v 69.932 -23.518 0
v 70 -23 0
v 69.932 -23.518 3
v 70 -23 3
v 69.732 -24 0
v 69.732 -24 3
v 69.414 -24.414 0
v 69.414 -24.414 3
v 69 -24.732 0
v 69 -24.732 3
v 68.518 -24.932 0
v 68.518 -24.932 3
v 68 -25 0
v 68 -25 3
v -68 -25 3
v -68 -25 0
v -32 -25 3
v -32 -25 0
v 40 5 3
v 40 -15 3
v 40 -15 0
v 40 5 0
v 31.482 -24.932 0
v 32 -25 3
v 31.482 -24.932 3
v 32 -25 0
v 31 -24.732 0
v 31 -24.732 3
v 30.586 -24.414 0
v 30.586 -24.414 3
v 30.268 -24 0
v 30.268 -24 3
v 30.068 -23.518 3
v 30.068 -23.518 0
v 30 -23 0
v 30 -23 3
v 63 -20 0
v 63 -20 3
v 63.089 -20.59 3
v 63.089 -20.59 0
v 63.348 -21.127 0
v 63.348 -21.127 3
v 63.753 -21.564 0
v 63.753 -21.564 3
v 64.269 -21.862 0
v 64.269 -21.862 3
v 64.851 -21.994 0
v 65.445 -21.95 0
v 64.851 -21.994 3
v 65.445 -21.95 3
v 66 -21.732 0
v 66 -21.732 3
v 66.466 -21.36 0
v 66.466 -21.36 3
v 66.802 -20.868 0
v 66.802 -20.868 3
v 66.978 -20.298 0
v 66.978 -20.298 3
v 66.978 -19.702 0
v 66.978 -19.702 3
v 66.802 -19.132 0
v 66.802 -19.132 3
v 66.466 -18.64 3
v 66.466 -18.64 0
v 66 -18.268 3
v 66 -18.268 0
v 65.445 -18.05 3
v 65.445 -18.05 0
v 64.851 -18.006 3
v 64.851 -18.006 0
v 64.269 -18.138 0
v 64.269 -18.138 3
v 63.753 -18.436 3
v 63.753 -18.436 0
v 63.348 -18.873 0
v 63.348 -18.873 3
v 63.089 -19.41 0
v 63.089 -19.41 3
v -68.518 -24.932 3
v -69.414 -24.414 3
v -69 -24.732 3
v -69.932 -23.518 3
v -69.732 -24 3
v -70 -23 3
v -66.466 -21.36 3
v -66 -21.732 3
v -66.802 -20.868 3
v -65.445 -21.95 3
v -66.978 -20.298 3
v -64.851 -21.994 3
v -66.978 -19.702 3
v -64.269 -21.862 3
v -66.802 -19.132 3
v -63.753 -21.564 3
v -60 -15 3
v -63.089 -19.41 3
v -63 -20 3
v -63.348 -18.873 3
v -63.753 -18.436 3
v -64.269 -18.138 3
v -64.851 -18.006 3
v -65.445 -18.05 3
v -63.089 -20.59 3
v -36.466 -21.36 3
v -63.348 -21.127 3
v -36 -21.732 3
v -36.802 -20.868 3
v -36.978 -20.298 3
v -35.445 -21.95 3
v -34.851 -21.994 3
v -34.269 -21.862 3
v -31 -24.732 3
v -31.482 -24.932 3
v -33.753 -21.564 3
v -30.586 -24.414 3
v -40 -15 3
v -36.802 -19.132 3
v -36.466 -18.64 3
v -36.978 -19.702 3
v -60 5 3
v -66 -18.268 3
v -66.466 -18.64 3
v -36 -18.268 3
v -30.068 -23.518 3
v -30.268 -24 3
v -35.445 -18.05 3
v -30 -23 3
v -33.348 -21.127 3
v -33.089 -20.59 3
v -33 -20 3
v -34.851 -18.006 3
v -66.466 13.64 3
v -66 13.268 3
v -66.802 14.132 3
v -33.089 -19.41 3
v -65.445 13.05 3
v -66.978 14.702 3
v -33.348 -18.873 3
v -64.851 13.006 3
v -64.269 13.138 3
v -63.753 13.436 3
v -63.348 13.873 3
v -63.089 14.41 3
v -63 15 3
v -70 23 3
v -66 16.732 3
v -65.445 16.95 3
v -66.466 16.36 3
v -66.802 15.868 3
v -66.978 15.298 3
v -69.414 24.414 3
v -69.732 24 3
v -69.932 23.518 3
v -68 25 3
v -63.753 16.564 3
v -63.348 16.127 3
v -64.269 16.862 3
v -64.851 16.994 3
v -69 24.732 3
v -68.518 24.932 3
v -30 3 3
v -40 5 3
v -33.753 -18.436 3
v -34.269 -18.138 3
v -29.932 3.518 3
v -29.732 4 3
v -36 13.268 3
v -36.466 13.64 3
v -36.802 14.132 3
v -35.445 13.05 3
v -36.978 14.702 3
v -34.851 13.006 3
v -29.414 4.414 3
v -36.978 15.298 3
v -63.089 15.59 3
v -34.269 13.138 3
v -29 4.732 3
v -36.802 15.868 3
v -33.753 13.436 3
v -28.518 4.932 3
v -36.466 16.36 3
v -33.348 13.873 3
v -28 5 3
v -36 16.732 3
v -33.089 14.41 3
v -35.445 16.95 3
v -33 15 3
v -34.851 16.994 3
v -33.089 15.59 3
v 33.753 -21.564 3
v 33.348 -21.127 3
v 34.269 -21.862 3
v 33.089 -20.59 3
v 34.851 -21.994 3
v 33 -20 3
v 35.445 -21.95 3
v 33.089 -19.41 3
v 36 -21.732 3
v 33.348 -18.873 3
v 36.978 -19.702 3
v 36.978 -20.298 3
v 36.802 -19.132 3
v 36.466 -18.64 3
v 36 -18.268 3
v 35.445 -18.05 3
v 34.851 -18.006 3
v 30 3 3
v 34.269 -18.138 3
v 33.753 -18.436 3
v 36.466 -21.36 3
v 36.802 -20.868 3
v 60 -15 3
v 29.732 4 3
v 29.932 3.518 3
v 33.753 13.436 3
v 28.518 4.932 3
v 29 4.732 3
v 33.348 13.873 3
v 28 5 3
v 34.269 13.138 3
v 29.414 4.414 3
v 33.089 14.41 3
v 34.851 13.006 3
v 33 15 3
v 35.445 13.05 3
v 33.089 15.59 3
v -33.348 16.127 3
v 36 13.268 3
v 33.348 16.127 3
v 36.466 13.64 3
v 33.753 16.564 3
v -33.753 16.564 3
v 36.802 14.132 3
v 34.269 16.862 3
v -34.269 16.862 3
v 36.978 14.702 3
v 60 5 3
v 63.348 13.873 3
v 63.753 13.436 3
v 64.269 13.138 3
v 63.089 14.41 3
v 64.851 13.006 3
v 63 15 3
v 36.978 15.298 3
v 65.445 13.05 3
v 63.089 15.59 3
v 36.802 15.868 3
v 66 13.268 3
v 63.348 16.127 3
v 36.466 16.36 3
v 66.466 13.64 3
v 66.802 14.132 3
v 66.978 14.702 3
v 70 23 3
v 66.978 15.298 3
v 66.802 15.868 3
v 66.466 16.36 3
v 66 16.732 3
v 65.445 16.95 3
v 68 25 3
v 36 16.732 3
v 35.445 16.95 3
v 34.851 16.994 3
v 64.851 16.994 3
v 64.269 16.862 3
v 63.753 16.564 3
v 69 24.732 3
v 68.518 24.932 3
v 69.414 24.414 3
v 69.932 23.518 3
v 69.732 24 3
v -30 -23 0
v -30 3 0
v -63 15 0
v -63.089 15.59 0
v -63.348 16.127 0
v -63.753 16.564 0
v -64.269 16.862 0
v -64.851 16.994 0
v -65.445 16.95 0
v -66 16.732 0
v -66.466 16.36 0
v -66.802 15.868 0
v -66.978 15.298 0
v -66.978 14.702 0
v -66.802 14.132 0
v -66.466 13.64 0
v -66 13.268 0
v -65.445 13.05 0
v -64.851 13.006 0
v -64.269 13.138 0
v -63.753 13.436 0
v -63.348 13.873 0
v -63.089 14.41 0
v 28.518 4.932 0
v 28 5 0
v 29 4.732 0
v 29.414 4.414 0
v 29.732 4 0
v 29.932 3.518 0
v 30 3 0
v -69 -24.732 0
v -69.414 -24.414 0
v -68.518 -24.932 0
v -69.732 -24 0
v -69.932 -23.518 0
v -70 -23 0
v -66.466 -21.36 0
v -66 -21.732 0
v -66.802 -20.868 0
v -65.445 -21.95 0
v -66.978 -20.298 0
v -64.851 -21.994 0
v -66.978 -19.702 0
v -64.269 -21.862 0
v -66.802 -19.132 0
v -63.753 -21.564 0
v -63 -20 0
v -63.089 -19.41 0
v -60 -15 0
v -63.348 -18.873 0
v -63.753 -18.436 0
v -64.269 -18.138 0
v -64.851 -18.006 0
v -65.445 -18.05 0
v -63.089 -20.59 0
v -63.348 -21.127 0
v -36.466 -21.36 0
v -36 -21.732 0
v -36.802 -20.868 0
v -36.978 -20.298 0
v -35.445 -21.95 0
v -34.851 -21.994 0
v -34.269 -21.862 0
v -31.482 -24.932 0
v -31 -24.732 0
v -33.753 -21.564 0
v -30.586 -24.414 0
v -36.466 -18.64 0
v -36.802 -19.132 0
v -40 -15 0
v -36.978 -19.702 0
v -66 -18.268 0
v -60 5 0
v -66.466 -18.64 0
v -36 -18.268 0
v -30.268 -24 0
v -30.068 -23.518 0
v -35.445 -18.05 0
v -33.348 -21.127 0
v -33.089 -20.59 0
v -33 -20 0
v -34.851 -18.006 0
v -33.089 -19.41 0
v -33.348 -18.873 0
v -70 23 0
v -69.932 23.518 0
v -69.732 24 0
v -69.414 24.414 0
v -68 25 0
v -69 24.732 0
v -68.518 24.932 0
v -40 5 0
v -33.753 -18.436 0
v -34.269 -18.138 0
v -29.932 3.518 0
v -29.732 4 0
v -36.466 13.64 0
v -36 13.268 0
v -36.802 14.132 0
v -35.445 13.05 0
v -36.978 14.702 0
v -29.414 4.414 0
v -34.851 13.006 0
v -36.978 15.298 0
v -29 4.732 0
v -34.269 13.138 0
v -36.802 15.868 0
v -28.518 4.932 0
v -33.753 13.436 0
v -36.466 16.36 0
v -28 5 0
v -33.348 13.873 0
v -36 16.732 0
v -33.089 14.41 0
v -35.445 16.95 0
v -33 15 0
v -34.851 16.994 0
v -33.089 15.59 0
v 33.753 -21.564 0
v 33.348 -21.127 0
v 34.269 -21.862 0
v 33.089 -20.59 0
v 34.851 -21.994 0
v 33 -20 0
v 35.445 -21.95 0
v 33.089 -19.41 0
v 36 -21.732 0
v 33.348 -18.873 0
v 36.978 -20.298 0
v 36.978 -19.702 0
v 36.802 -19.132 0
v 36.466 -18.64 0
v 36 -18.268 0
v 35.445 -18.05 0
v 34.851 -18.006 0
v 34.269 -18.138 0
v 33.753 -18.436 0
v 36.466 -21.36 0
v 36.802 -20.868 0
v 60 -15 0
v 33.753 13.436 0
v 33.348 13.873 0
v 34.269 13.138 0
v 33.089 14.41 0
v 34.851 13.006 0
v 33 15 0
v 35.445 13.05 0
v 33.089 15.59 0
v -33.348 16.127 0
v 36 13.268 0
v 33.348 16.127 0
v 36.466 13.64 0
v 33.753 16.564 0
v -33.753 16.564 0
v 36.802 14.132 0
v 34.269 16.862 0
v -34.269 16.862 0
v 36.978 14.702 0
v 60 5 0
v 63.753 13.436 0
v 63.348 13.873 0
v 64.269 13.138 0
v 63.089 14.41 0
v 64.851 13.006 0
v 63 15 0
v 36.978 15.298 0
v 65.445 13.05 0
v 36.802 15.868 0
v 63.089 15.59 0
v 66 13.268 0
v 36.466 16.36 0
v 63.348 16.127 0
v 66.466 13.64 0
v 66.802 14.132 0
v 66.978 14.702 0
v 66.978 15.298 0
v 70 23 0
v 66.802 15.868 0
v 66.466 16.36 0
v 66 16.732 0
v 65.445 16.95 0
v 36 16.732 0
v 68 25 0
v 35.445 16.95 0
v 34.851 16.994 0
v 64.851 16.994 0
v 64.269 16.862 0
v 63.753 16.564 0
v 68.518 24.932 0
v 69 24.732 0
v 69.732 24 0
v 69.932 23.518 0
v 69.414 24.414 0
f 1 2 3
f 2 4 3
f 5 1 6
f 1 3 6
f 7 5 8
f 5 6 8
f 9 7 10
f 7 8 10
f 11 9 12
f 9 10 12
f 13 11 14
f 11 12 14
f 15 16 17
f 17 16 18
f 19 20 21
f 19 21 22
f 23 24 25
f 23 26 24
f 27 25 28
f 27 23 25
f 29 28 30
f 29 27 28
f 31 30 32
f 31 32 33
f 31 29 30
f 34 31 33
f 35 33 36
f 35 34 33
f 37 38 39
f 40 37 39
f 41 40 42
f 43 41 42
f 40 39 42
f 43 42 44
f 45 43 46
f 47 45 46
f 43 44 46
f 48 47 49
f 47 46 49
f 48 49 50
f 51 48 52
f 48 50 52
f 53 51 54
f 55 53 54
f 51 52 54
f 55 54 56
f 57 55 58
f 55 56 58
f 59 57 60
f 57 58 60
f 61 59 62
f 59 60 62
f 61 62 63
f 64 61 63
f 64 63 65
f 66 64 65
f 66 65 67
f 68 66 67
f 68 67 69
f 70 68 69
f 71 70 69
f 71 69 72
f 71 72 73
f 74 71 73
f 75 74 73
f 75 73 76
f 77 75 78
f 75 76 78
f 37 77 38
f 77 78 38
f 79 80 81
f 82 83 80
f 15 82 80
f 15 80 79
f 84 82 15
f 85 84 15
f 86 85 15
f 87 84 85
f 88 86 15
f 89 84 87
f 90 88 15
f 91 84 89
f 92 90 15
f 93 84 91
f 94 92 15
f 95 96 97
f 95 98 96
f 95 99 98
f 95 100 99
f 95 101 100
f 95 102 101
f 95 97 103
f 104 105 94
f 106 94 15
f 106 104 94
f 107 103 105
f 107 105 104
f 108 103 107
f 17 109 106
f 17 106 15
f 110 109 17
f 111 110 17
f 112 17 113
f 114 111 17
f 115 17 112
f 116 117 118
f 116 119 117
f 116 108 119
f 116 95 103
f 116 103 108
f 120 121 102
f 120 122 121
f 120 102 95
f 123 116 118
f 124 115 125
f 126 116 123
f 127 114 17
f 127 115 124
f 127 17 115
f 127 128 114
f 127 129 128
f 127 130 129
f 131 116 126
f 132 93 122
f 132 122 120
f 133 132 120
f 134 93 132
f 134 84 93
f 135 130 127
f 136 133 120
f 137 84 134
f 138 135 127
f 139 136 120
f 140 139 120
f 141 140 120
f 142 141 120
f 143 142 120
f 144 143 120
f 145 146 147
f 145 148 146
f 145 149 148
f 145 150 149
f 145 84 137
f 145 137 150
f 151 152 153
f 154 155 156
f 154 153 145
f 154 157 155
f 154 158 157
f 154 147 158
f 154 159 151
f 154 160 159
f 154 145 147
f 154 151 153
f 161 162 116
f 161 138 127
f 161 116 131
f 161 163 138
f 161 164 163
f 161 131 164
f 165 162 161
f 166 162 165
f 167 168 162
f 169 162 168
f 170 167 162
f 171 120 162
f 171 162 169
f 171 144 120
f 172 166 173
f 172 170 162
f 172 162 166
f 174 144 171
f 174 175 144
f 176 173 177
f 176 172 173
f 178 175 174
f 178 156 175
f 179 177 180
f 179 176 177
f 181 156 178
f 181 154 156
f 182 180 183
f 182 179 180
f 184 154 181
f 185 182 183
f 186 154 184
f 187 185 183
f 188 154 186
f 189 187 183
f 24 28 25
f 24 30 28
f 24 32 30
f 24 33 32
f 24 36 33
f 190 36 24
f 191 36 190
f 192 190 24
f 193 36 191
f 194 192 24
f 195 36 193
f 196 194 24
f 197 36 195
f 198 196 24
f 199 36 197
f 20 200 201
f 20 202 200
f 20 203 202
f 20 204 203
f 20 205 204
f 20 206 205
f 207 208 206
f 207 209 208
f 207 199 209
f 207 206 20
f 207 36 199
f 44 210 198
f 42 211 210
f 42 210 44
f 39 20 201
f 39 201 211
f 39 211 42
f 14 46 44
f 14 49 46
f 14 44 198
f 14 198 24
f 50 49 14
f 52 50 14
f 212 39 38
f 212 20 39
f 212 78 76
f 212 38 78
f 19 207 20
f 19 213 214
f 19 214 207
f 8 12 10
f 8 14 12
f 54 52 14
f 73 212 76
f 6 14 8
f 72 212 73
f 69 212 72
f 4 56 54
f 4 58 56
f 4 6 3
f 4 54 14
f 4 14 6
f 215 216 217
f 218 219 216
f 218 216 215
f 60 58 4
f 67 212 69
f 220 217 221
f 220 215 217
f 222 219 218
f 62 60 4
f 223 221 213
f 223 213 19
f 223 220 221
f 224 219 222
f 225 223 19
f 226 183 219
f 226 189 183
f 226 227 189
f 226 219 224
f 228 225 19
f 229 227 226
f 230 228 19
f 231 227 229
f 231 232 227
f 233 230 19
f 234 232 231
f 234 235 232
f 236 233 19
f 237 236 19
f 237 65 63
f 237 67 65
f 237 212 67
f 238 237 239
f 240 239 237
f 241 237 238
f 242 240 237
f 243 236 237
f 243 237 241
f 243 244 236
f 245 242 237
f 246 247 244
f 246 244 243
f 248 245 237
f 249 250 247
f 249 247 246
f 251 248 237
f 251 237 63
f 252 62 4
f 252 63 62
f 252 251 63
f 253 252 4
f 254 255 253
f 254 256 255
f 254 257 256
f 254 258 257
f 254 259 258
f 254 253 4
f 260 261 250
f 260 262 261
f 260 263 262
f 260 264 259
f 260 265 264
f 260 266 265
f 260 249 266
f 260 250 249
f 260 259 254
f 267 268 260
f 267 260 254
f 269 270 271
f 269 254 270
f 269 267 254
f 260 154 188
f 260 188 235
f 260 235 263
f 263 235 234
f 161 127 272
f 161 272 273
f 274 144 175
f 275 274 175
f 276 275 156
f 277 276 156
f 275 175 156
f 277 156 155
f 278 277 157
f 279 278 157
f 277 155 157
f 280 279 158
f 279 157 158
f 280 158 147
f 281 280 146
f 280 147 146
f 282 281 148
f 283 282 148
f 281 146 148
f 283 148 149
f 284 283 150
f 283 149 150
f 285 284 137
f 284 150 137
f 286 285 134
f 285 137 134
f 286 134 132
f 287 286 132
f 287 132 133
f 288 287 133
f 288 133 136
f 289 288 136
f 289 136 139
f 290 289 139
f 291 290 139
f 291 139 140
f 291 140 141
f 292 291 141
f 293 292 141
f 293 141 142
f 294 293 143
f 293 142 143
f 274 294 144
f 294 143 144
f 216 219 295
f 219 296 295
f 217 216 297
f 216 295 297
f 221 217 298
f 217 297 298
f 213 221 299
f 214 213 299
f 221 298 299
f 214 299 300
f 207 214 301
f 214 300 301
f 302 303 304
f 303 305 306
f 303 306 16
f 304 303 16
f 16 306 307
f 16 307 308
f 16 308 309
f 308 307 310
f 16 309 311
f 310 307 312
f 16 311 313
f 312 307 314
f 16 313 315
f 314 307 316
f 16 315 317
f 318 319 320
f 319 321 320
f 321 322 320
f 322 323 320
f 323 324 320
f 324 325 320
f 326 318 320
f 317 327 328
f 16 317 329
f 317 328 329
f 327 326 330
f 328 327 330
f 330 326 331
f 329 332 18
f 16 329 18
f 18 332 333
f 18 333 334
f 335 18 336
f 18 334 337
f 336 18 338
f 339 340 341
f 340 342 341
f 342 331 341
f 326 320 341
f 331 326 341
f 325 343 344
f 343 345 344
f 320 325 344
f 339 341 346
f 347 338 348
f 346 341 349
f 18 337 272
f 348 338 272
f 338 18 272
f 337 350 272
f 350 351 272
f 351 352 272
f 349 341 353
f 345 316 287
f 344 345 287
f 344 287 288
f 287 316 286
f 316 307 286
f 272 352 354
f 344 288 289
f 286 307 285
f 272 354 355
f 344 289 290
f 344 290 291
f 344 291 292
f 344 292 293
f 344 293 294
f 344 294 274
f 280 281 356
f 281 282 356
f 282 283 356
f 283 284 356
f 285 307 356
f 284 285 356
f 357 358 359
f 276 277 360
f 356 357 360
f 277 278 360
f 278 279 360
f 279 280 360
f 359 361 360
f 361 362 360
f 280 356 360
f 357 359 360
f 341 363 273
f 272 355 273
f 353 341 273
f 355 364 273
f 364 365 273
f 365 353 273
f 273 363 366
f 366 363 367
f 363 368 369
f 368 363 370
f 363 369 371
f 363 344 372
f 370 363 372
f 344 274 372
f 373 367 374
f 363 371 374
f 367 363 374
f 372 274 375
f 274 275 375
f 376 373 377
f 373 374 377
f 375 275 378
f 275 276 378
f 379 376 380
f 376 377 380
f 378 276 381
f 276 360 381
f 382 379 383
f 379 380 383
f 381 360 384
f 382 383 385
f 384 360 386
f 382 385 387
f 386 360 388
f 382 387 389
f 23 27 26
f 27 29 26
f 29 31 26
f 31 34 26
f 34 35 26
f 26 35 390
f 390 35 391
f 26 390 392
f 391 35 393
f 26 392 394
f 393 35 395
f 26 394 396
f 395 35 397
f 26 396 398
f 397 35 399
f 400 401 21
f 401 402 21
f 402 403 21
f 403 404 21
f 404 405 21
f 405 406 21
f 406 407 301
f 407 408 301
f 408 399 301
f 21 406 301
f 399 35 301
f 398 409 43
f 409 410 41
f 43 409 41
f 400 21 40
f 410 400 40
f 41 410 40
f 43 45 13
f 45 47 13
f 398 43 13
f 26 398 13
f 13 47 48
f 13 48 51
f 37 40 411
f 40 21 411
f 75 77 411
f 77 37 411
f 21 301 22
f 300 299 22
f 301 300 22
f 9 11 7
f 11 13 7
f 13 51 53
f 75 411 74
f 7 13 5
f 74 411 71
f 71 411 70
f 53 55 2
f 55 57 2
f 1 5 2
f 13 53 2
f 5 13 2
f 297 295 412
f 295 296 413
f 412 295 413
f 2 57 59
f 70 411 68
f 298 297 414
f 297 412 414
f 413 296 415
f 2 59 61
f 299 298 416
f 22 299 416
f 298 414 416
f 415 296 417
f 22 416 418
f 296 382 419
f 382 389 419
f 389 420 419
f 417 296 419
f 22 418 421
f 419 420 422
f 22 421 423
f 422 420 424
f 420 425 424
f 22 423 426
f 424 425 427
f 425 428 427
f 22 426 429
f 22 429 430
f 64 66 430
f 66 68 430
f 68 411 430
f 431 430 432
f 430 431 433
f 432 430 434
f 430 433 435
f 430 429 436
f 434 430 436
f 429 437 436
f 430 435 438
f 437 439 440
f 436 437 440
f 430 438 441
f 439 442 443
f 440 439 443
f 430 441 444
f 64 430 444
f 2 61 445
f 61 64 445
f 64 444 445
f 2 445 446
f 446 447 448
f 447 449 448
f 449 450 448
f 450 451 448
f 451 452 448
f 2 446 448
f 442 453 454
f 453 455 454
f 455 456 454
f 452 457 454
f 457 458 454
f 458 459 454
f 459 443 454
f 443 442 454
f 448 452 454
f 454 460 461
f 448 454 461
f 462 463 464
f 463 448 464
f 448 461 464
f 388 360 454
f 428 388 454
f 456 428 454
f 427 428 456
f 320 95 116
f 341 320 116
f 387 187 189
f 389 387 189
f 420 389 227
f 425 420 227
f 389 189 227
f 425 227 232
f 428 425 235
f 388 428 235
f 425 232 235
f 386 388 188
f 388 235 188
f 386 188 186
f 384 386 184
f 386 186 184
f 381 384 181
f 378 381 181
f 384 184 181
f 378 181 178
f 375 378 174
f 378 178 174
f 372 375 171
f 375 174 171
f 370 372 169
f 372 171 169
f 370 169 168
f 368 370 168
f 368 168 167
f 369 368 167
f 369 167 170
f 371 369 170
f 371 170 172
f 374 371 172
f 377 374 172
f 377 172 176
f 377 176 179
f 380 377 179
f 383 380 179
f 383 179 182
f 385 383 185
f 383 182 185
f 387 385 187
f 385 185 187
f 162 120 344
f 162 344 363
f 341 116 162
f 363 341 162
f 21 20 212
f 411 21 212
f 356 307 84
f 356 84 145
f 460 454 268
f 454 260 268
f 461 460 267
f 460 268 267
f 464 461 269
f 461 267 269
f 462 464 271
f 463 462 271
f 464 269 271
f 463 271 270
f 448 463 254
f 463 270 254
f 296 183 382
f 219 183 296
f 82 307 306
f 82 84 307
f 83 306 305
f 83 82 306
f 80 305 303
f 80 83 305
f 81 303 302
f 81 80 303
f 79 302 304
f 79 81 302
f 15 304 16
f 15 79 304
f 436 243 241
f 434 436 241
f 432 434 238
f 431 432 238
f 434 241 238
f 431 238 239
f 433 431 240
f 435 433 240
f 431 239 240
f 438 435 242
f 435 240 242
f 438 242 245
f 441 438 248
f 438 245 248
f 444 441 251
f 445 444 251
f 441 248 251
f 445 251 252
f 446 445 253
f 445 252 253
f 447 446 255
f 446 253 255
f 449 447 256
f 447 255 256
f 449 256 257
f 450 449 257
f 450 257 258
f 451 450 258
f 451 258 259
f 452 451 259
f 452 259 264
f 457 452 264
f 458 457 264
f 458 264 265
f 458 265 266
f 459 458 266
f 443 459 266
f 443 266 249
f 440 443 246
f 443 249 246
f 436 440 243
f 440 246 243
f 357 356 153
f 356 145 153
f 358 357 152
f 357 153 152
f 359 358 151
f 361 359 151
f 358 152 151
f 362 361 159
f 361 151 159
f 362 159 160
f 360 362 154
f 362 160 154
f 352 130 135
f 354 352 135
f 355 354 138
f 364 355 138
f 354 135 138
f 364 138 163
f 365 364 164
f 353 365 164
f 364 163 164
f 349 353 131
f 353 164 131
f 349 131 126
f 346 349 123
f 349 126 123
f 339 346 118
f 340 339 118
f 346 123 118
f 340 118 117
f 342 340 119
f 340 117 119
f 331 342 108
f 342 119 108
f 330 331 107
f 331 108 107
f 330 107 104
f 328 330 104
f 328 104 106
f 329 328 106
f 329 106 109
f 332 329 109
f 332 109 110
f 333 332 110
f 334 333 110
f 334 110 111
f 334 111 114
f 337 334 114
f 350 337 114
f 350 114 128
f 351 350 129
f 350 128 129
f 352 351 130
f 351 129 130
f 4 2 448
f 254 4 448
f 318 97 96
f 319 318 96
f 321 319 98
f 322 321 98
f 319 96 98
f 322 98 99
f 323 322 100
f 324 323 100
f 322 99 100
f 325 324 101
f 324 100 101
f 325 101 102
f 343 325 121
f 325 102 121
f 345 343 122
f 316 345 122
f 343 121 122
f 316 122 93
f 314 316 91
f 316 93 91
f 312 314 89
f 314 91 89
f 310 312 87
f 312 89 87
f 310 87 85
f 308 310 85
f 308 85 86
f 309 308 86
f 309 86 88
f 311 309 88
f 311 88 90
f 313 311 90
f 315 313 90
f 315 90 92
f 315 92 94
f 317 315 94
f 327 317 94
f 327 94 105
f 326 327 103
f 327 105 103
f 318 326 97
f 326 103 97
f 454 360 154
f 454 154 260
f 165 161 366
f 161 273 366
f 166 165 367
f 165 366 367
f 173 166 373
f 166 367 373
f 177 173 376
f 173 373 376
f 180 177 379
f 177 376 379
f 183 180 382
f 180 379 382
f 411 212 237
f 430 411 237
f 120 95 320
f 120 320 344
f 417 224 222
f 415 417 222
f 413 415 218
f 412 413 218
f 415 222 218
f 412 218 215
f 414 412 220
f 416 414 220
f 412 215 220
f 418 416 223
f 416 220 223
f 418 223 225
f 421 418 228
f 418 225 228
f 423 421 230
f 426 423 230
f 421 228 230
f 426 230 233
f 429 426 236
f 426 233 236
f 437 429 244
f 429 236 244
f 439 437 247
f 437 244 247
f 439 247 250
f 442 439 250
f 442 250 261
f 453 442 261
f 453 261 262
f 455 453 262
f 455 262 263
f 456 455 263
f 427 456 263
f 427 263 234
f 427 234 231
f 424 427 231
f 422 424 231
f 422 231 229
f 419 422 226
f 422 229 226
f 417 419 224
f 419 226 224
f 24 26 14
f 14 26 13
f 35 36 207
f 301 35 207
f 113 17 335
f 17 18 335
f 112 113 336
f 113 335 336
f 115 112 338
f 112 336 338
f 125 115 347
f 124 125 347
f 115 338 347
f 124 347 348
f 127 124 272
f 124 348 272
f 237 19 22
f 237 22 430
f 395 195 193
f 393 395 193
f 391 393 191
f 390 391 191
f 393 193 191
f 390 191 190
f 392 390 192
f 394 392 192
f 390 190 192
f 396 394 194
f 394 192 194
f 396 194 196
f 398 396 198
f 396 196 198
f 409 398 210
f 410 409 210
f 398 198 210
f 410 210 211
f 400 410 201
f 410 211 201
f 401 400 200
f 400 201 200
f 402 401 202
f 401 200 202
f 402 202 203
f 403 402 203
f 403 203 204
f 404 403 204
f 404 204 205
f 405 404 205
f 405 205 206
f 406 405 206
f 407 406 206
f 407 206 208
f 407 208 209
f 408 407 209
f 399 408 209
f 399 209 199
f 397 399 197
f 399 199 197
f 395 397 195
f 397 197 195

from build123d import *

# Parameters (mm, degrees)
SKETCH_1_W          = 140
SKETCH_1_H          = 50
EXTRUDE_1_DEPTH     = 3
SKETCH_2_W          = 20
SKETCH_2_H          = 20
CUT_EXTRUDE_1_DEPTH = 3
SKETCH_3_W          = 60
SKETCH_3_H          = 30
CUT_EXTRUDE_2_DEPTH = 3
SKETCH_4_R          = 2
CUT_EXTRUDE_4_DEPTH = 3
SKETCH_5_R          = 2
CUT_EXTRUDE_5_DEPTH = 3
FILLET_1_R          = 2


with BuildPart() as part:
    # 草图1 → 凸台-拉伸1 (new body)
    with BuildSketch(Plane.XY):
        Rectangle(SKETCH_1_W, SKETCH_1_H)
    extrude(amount=EXTRUDE_1_DEPTH)

    # 草图2 → 切除-拉伸1 (cut)
    with BuildSketch(Plane.XY.offset(3)):
        with Locations((-50, -5)):
            Rectangle(SKETCH_2_W, SKETCH_2_H)
        with Locations((50, -5)):
            Rectangle(SKETCH_2_W, SKETCH_2_H)
    extrude(amount=-CUT_EXTRUDE_1_DEPTH, mode=Mode.SUBTRACT)

    # 草图3 → 切除-拉伸2 (cut)
    with BuildSketch(Plane.XY.offset(3)):
        with Locations((0, -10)):
            Rectangle(SKETCH_3_W, SKETCH_3_H)
    extrude(amount=-CUT_EXTRUDE_2_DEPTH, mode=Mode.SUBTRACT)

    # 草图4 → 切除-拉伸4 (cut)
    with BuildSketch(Plane.XY.offset(3)):
        with Locations((-65, -20)):
            Circle(SKETCH_4_R)
        with Locations((-35, -20)):
            Circle(SKETCH_4_R)
        with Locations(Location((65, -20, 0), (0, 0, 180))):
            Circle(SKETCH_4_R)
        with Locations(Location((35, -20, 0), (0, 0, 180))):
            Circle(SKETCH_4_R)
    extrude(amount=-CUT_EXTRUDE_4_DEPTH, mode=Mode.SUBTRACT)

    # 草图5 → 切除-拉伸5 (cut)
    with BuildSketch(Plane.XY.offset(3)):
        with Locations((-65, 15)):
            Circle(SKETCH_5_R)
        with Locations((-35, 15)):
            Circle(SKETCH_5_R)
        with Locations(Location((35, 15, 0), (0, 0, 180))):
            Circle(SKETCH_5_R)
        with Locations(Location((65, 15, 0), (0, 0, 180))):
            Circle(SKETCH_5_R)
    extrude(amount=-CUT_EXTRUDE_5_DEPTH, mode=Mode.SUBTRACT)

    # 圆角1
    fillet_1_edges = [part.edges().sort_by_distance(p)[0] for p in [
        (30, 5, 1.5),
        (30, -25, 1.5),
        (-30, -25, 1.5),
        (-30, 5, 1.5),
        (70, -25, 1.5),
        (-70, -25, 1.5),
        (-70, 25, 1.5),
        (70, 25, 1.5),
    ]]
    fillet(fillet_1_edges, radius=FILLET_1_R)


solid = part.part
